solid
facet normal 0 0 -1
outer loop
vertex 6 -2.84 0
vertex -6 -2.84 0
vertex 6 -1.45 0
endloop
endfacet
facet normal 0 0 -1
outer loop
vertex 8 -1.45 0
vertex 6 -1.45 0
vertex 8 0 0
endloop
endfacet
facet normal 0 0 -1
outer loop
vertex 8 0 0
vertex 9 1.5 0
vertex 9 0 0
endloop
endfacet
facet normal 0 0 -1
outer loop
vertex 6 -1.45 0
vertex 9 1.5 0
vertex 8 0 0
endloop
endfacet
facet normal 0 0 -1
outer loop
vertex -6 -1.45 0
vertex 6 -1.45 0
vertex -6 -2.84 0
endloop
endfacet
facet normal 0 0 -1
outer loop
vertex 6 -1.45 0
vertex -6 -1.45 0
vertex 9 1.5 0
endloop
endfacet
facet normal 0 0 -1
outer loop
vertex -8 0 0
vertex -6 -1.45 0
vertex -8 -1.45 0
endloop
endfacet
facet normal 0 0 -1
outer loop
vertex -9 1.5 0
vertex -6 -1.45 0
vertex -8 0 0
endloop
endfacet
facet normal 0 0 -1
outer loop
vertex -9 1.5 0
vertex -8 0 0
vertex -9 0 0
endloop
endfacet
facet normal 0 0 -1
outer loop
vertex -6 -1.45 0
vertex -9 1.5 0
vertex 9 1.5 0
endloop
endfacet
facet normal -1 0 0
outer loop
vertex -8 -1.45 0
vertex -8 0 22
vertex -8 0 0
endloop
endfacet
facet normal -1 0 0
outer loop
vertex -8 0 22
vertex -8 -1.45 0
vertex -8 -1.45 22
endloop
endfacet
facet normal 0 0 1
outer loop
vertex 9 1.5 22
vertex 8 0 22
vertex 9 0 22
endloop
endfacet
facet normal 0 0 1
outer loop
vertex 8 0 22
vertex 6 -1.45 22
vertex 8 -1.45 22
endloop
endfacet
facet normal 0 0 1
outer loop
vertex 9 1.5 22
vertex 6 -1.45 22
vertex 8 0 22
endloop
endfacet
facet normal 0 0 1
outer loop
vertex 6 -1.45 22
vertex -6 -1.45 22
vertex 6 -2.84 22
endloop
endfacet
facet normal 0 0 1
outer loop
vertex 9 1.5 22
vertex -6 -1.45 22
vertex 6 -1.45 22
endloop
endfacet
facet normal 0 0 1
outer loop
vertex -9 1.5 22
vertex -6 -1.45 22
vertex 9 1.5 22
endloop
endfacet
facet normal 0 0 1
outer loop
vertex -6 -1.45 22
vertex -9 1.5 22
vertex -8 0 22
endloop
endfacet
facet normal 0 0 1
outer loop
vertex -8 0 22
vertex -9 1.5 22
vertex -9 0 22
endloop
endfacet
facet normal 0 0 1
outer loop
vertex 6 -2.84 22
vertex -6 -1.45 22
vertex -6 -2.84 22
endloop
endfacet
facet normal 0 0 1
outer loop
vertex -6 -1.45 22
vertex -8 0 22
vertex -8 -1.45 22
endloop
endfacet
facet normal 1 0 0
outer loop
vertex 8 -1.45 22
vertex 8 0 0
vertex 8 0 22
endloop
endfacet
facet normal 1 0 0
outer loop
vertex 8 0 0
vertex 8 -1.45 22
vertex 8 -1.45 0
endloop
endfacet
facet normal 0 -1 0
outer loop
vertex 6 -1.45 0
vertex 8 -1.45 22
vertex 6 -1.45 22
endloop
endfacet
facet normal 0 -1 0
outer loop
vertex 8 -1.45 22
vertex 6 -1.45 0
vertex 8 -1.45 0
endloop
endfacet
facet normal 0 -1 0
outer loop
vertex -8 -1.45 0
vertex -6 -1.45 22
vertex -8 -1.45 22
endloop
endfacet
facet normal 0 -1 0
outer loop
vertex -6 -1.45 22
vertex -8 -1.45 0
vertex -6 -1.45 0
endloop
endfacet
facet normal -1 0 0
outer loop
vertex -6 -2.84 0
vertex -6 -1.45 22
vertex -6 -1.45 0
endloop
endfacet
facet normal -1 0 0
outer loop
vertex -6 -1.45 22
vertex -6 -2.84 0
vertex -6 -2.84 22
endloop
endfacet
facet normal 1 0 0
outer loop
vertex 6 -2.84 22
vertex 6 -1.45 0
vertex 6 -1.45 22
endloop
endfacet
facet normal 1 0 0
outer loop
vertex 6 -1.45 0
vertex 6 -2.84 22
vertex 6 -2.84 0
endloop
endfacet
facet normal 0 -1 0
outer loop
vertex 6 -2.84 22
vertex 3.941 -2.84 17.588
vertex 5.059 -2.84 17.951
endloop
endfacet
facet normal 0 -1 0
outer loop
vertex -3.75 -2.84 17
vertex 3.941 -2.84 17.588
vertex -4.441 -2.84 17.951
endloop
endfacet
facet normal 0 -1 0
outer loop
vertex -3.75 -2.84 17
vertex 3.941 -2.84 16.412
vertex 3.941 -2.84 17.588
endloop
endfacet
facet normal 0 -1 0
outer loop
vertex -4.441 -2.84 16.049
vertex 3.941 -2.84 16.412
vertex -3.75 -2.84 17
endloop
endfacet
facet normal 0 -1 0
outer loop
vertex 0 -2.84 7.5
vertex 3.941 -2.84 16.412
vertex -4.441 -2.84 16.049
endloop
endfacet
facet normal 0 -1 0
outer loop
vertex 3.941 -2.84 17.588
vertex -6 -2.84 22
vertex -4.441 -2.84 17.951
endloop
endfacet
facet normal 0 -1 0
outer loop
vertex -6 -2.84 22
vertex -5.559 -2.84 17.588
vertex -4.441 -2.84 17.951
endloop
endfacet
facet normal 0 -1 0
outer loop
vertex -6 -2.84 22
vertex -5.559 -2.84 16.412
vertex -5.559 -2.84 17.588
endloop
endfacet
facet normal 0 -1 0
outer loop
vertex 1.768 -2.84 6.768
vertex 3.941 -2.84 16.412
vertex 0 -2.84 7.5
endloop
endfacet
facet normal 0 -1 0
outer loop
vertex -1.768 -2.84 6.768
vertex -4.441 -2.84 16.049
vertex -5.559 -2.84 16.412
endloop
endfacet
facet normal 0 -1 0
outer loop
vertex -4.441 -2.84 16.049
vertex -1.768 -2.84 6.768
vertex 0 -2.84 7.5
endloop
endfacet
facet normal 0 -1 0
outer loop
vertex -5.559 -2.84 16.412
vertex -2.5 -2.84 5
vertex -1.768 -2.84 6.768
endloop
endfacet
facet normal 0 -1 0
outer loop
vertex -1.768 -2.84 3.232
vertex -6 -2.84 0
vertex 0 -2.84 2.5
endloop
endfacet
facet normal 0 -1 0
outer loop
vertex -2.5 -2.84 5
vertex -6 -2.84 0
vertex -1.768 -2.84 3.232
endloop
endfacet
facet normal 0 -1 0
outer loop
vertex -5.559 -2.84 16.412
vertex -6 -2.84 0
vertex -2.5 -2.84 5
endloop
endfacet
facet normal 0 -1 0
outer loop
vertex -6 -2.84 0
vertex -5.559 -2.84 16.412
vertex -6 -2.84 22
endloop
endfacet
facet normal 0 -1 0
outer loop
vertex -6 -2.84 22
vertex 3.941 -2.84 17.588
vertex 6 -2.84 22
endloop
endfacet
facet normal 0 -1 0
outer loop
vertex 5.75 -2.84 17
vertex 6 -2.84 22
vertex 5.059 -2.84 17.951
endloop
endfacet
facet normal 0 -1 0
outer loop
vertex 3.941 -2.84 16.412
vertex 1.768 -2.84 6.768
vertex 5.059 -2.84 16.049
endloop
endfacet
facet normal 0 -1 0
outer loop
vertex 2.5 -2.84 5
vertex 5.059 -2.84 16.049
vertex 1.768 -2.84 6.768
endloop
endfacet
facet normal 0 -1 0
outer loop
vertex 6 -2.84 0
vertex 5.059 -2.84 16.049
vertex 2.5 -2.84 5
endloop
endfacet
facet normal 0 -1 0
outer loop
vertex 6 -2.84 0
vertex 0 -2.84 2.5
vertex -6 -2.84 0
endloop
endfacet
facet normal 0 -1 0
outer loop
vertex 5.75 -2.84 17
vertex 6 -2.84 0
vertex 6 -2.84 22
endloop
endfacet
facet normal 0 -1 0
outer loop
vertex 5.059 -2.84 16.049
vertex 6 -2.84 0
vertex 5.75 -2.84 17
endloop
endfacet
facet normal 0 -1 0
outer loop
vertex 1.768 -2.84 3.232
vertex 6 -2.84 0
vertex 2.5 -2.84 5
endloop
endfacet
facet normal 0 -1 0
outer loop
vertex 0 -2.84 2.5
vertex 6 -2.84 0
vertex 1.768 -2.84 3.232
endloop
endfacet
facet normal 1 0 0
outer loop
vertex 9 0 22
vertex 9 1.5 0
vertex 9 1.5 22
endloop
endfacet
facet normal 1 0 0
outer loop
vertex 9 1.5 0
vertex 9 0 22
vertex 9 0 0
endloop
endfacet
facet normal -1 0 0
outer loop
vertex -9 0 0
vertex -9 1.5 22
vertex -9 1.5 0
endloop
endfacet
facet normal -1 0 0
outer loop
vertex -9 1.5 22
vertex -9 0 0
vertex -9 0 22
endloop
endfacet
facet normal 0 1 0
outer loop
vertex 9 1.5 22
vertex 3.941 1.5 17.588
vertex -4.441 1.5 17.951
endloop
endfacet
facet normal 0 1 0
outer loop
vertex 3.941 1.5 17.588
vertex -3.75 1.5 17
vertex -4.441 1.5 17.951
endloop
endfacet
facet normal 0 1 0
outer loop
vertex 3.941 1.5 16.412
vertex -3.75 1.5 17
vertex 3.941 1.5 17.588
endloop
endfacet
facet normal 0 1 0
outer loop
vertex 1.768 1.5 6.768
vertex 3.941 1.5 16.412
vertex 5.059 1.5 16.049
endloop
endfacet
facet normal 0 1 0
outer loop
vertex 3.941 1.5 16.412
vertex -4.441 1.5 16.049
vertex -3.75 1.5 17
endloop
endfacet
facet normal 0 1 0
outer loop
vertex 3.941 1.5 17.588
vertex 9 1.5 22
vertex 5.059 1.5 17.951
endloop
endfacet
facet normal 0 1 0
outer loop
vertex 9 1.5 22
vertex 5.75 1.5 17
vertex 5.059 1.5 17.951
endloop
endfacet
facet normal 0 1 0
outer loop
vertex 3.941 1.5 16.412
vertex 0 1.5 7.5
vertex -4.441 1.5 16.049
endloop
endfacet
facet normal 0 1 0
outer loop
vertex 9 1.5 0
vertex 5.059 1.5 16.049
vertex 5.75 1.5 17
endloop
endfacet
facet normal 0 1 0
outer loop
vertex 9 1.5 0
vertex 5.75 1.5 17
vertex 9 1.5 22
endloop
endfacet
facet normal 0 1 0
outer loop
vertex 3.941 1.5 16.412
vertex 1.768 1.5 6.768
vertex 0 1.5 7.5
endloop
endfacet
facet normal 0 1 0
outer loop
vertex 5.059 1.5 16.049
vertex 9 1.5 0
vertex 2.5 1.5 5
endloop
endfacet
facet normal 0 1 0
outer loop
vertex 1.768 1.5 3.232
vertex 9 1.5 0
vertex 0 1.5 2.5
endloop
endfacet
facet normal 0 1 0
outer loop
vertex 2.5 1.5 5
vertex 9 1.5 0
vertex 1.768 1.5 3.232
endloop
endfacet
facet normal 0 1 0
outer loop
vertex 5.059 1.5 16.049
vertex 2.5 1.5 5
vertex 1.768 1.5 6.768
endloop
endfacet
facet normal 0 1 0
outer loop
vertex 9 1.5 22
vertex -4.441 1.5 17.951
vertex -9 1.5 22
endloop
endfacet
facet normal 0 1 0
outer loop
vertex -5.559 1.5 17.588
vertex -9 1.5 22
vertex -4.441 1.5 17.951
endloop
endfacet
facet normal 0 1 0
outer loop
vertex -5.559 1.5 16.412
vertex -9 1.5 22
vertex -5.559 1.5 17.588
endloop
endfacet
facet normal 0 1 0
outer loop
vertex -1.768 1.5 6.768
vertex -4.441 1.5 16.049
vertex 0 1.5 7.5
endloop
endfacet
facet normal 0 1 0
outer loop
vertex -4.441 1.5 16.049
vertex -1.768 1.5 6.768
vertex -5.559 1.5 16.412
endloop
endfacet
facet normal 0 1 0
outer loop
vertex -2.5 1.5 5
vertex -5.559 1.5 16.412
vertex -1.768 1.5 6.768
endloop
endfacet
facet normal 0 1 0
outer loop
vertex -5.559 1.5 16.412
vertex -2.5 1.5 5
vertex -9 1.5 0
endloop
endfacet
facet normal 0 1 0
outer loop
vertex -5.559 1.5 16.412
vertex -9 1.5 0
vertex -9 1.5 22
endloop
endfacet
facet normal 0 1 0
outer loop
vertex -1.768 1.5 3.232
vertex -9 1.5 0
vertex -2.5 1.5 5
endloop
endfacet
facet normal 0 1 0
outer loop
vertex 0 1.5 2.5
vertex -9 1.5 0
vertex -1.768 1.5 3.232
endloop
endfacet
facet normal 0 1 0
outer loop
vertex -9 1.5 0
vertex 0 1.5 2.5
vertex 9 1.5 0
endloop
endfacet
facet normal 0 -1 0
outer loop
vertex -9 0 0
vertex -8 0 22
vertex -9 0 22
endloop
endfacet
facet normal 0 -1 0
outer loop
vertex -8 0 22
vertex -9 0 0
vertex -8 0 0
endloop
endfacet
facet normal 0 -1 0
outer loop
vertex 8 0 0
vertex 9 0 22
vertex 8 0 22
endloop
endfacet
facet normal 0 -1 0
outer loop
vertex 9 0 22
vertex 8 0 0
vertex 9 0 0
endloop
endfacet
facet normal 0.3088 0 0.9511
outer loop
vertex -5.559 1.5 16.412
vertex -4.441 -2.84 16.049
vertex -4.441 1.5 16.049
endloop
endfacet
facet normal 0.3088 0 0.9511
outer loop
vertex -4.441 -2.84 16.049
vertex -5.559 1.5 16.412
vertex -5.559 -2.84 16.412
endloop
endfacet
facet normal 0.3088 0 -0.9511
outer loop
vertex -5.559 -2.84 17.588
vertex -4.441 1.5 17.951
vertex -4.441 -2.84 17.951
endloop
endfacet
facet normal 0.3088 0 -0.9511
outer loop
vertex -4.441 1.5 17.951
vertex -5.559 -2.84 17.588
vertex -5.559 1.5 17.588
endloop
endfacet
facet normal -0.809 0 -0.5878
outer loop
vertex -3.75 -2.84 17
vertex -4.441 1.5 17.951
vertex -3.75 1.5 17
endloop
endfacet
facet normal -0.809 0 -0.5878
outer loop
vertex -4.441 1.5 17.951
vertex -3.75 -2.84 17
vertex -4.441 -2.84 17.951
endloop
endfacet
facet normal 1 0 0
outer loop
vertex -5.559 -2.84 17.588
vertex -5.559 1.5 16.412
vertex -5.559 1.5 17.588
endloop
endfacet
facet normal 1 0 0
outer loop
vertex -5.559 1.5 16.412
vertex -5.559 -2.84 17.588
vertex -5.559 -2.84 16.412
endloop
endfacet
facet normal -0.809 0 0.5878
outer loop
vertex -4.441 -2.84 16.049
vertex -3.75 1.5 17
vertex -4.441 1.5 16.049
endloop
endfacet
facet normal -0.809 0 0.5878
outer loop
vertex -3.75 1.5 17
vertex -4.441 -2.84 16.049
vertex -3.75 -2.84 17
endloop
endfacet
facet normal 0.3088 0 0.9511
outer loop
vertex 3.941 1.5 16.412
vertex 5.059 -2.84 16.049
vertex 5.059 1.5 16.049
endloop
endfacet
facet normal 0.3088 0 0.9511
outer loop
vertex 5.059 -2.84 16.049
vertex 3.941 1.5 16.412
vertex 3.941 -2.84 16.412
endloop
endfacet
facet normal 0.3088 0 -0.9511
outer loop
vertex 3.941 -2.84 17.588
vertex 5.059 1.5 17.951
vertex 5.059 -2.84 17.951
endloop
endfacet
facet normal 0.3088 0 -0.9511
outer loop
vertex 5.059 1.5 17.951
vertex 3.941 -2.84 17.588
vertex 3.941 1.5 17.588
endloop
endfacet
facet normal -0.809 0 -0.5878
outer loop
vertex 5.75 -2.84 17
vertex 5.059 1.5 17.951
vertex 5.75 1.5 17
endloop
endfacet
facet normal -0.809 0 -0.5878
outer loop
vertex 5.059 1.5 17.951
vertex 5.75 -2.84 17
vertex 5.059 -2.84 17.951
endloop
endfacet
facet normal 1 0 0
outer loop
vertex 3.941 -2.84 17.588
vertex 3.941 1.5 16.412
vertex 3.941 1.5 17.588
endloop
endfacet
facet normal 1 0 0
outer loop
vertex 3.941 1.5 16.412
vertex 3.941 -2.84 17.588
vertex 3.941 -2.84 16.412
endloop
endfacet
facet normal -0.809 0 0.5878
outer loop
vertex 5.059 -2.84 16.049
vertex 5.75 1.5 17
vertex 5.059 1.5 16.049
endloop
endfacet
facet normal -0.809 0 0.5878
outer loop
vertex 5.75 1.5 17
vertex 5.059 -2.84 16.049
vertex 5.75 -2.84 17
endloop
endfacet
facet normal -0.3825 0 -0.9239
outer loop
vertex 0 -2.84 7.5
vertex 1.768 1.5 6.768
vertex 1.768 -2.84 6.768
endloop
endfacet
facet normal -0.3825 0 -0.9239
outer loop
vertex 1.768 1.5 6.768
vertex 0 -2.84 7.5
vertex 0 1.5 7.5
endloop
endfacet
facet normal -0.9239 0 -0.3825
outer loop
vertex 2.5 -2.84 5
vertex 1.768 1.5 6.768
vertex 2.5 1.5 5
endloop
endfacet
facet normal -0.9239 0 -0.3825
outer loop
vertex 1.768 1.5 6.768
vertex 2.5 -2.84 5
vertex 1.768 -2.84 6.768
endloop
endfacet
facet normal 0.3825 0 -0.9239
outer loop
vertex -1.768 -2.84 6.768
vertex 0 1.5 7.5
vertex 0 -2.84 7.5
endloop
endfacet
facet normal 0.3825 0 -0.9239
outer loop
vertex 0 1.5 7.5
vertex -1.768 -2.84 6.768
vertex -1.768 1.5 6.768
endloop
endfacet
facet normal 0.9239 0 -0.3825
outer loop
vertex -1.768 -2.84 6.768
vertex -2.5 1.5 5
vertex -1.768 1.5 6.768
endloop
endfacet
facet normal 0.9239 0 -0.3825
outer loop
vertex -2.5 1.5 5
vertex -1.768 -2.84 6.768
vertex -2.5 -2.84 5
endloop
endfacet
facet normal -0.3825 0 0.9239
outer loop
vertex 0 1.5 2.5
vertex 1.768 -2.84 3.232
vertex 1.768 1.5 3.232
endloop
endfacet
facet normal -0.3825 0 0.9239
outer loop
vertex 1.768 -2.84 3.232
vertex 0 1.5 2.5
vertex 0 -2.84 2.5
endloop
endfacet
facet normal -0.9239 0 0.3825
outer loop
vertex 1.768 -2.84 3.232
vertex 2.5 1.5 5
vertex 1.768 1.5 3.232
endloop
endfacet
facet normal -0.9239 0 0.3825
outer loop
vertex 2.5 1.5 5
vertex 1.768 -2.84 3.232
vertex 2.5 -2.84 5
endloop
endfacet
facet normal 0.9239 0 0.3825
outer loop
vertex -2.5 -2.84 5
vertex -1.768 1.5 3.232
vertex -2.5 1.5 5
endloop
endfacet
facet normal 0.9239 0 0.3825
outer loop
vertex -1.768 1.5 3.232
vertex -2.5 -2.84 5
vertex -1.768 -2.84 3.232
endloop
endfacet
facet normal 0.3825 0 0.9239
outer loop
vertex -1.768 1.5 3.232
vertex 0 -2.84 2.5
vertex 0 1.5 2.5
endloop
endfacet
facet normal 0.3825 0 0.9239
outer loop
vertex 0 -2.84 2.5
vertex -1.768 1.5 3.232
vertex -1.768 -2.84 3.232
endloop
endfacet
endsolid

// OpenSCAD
// file: includes/k8200_rail.scad
module k8200_rail(){
    union(){
        linear_extrude(rlen)translate([0,-0.7,0])square([16,1.5],center=true);
        linear_extrude(rlen)translate([0,-2.09,0])square([12,1.5],center=true);
    }
}
//k8200_rail(rlen=20);
// file: includes/hex nut sizes.scad
//Hex nut template for cutouts in stuff that require nuts or bolts

//nutd=13; // change this to suit the size of bolt head you want
//h=8;

mult = 1.1538461538461538461538461538462; // don't change this
module nut()
{
cylinder(d=d*mult,h=h,center=center,$fn=6); // don't do anything here
}
// main file
include <includes/hex nut sizes.scad>
include <includes/k8200_rail.scad>

rlen=22;

//this won't be rendered in the STL, it's only for design reference
%translate([0,0,5+6])cube([30,30,1],center=true); //nothing below this to allow clearance from switch contacts to bolt head

//rotate([-90,0,0])
difference(){
union(){
    k8200_rail();
    translate([0,0.75,rlen/2])cube([18,1.5,rlen],center=true);
    
}
    translate([0,0,5])rotate([90,0,0])cylinder(d=5,h=10,center=true);
    translate([0,0,5+6+6])
        rotate([90,0,0]){
            translate([-9.5/2,0,0])cylinder(d=2,h=10,center=true);
            translate([9.5/2,0,0])cylinder(d=2,h=10,center=true);
            }
}
